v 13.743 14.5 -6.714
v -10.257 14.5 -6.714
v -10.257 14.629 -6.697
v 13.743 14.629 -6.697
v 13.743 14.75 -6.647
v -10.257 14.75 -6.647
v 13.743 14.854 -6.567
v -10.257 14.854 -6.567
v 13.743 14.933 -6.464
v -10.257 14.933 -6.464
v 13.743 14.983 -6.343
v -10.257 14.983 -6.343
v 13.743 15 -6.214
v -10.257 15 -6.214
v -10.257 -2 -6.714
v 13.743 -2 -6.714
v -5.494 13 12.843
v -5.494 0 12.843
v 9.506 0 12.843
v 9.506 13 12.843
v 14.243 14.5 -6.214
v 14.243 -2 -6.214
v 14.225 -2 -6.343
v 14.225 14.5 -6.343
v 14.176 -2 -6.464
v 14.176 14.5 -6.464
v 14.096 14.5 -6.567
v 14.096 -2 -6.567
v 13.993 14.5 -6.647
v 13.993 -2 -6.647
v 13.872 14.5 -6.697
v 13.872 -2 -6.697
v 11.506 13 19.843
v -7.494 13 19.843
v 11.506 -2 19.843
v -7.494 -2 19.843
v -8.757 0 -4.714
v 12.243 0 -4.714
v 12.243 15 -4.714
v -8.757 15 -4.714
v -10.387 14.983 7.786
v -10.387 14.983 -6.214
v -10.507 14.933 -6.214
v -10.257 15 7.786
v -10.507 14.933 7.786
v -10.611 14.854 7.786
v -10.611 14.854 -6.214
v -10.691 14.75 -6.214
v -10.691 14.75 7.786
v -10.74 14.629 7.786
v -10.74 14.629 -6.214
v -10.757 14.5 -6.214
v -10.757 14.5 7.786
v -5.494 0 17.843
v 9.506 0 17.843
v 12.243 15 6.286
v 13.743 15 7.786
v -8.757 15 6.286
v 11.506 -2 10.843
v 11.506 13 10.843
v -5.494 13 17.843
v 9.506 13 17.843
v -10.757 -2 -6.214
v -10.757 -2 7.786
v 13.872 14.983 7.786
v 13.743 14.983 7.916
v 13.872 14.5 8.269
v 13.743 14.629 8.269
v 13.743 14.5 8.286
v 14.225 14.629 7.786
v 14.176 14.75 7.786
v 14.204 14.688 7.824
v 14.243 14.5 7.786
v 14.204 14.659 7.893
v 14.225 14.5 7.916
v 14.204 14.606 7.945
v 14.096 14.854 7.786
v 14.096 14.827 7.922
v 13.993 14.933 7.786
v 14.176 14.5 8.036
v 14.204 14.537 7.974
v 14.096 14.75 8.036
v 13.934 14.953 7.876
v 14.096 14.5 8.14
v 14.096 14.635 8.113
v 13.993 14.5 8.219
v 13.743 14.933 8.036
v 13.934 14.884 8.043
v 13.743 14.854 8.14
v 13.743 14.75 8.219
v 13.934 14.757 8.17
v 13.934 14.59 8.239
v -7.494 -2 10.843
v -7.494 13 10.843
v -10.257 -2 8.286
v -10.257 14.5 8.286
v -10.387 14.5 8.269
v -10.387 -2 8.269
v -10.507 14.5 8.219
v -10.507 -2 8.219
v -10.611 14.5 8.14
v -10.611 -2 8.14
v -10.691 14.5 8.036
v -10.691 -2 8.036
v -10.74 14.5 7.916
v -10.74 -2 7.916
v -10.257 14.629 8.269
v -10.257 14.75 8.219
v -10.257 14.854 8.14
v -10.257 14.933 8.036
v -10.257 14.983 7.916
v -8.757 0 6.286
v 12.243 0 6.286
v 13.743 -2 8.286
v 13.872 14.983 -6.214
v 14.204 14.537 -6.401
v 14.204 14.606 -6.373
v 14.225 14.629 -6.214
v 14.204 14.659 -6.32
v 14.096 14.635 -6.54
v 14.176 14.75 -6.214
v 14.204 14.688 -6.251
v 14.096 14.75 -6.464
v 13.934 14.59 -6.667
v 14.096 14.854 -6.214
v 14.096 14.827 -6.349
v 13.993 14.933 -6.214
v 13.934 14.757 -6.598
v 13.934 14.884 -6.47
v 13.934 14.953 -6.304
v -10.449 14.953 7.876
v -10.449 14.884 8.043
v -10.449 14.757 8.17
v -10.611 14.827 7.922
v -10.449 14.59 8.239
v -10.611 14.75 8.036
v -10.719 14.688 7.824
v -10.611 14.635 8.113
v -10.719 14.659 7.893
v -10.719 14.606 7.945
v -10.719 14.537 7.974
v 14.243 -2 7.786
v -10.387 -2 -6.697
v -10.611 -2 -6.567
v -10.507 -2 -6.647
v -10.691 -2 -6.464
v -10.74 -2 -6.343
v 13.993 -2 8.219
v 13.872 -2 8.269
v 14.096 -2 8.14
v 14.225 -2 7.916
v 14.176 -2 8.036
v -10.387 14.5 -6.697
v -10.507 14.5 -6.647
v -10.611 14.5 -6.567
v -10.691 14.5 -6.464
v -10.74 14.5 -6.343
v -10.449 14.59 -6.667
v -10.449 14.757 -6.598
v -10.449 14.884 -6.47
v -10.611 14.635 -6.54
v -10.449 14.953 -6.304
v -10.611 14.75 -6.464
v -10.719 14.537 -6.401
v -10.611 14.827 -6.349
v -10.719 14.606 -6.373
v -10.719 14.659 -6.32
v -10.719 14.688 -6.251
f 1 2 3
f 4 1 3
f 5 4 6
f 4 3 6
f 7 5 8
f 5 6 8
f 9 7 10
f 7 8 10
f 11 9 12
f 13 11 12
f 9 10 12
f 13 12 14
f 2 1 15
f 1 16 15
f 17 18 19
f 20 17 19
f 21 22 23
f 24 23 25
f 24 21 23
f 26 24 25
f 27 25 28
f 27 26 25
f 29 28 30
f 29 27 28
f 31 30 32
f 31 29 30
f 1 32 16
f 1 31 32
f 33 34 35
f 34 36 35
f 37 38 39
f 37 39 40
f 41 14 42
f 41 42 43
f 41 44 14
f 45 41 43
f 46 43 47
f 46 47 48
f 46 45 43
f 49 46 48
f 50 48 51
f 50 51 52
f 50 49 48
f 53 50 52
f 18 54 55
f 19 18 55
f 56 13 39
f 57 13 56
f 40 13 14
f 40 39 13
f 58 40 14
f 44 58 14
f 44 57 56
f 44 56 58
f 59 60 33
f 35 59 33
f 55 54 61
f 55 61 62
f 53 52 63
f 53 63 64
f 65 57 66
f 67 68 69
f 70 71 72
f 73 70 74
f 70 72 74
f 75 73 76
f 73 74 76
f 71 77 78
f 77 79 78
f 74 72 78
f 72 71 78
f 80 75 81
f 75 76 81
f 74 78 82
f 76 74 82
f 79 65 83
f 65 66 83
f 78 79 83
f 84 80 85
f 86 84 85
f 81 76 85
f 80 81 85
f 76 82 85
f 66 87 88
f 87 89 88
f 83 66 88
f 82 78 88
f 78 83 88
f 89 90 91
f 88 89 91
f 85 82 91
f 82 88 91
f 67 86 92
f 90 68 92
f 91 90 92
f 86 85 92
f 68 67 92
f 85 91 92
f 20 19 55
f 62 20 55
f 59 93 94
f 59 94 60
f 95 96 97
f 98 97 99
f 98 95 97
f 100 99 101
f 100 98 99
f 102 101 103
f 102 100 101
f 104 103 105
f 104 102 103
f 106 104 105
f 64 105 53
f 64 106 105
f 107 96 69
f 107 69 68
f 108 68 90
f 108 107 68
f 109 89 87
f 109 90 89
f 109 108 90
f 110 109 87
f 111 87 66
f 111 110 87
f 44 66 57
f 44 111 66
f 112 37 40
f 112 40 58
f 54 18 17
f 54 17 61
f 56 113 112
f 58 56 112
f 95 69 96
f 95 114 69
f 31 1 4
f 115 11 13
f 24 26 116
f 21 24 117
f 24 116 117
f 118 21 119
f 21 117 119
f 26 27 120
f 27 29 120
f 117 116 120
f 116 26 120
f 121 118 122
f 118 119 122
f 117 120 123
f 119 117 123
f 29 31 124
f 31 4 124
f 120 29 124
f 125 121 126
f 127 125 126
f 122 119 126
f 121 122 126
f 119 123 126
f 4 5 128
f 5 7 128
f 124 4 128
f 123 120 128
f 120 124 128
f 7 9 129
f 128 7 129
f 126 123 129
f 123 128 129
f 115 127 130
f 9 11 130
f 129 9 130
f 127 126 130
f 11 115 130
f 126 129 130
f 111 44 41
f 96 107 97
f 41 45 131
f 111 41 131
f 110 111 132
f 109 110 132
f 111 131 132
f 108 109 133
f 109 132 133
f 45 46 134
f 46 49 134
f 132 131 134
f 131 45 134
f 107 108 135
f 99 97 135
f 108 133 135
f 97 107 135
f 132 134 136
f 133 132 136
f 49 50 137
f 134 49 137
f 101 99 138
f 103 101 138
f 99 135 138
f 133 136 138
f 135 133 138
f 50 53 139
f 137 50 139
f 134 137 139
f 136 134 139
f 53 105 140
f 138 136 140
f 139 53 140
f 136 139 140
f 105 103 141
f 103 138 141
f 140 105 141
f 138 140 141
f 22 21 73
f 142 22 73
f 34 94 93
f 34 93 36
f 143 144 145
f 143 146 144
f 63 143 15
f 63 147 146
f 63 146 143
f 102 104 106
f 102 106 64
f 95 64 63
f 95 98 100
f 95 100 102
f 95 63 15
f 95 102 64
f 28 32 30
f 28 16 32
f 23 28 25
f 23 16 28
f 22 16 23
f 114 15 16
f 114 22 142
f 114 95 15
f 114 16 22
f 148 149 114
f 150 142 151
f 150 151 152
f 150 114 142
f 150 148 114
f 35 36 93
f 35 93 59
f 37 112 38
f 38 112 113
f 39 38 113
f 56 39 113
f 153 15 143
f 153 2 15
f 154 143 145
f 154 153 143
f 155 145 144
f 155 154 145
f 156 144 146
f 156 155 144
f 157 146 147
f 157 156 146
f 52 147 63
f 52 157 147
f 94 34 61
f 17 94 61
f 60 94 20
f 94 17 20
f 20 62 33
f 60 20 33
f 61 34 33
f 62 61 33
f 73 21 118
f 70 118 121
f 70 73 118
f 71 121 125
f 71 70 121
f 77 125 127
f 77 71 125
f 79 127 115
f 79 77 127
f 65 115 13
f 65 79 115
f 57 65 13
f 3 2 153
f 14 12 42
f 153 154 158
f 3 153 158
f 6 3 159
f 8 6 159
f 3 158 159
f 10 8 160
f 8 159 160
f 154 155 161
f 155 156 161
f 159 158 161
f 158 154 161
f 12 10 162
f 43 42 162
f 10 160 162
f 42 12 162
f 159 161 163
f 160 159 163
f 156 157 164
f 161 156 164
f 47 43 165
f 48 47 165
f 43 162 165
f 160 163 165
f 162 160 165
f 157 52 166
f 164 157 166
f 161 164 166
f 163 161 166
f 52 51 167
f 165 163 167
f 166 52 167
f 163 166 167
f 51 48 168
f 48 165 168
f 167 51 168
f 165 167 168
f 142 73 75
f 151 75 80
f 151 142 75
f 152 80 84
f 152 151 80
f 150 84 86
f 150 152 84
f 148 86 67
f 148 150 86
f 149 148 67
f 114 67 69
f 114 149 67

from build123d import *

# Parameters (mm, degrees)
F0_W     = 25
F0_H     = 15
F1_DEPTH = 2
F2_W     = 25
F2_H     = 15
F2_W_2   = 21
F2_H_2   = 11
F3_DEPTH = 15
F4_R     = 0.5
F5_R     = 0.5
F6_W     = 19
F6_H     = 9
F7_DEPTH = 2
F8_W     = 19
F8_H     = 9
F8_W_2   = 15
F8_H_2   = 5
F9_DEPTH = 13


with BuildPart() as f1:
    # F0 (on Front) → F1 (new body)
    with BuildSketch(Plane.XZ):
        with Locations((1.742505, 0.78626)):
            Rectangle(F0_W, F0_H)
    extrude(amount=F1_DEPTH)

    # F2 (on face) → F3 (join)
    with BuildSketch(Plane(origin=(0, 0, 0), x_dir=(-1, 0, 0), z_dir=(0, 1, 0))):
        with Locations((-1.742505, 0.78626)):
            Rectangle(F2_W, F2_H)
        with Locations((-1.742505, 0.78626)):
            Rectangle(F2_W_2, F2_H_2, mode=Mode.SUBTRACT)
    extrude(amount=F3_DEPTH)

    # F4
    f4_edges = [f1.edges().sort_by_distance(p)[0] for p in [
        (1.742505, 15, 8.28626),
        (1.742505, 15, -6.71374),
    ]]
    fillet(f4_edges, radius=F4_R)

    # F5
    f5_edges = [f1.edges().sort_by_distance(p)[0] for p in [
        (14.242505, 15, 0.78626),
        (-10.757495, 15, 0.78626),
    ]]
    fillet(f5_edges, radius=F5_R)


with BuildPart() as f7:
    # F6 (on Front) → F7 (new body)
    with BuildSketch(Plane.XZ):
        with Locations((2.005785, 15.342523)):
            Rectangle(F6_W, F6_H)
    extrude(amount=F7_DEPTH)

    # F8 (on Front) → F9 (join)
    with BuildSketch(Plane.XZ):
        with Locations((2.005785, 15.342523)):
            Rectangle(F8_W, F8_H)
        with Locations((2.005785, 15.342523)):
            Rectangle(F8_W_2, F8_H_2, mode=Mode.SUBTRACT)
    extrude(amount=-F9_DEPTH)


solid = Compound([f1.part, f7.part])
